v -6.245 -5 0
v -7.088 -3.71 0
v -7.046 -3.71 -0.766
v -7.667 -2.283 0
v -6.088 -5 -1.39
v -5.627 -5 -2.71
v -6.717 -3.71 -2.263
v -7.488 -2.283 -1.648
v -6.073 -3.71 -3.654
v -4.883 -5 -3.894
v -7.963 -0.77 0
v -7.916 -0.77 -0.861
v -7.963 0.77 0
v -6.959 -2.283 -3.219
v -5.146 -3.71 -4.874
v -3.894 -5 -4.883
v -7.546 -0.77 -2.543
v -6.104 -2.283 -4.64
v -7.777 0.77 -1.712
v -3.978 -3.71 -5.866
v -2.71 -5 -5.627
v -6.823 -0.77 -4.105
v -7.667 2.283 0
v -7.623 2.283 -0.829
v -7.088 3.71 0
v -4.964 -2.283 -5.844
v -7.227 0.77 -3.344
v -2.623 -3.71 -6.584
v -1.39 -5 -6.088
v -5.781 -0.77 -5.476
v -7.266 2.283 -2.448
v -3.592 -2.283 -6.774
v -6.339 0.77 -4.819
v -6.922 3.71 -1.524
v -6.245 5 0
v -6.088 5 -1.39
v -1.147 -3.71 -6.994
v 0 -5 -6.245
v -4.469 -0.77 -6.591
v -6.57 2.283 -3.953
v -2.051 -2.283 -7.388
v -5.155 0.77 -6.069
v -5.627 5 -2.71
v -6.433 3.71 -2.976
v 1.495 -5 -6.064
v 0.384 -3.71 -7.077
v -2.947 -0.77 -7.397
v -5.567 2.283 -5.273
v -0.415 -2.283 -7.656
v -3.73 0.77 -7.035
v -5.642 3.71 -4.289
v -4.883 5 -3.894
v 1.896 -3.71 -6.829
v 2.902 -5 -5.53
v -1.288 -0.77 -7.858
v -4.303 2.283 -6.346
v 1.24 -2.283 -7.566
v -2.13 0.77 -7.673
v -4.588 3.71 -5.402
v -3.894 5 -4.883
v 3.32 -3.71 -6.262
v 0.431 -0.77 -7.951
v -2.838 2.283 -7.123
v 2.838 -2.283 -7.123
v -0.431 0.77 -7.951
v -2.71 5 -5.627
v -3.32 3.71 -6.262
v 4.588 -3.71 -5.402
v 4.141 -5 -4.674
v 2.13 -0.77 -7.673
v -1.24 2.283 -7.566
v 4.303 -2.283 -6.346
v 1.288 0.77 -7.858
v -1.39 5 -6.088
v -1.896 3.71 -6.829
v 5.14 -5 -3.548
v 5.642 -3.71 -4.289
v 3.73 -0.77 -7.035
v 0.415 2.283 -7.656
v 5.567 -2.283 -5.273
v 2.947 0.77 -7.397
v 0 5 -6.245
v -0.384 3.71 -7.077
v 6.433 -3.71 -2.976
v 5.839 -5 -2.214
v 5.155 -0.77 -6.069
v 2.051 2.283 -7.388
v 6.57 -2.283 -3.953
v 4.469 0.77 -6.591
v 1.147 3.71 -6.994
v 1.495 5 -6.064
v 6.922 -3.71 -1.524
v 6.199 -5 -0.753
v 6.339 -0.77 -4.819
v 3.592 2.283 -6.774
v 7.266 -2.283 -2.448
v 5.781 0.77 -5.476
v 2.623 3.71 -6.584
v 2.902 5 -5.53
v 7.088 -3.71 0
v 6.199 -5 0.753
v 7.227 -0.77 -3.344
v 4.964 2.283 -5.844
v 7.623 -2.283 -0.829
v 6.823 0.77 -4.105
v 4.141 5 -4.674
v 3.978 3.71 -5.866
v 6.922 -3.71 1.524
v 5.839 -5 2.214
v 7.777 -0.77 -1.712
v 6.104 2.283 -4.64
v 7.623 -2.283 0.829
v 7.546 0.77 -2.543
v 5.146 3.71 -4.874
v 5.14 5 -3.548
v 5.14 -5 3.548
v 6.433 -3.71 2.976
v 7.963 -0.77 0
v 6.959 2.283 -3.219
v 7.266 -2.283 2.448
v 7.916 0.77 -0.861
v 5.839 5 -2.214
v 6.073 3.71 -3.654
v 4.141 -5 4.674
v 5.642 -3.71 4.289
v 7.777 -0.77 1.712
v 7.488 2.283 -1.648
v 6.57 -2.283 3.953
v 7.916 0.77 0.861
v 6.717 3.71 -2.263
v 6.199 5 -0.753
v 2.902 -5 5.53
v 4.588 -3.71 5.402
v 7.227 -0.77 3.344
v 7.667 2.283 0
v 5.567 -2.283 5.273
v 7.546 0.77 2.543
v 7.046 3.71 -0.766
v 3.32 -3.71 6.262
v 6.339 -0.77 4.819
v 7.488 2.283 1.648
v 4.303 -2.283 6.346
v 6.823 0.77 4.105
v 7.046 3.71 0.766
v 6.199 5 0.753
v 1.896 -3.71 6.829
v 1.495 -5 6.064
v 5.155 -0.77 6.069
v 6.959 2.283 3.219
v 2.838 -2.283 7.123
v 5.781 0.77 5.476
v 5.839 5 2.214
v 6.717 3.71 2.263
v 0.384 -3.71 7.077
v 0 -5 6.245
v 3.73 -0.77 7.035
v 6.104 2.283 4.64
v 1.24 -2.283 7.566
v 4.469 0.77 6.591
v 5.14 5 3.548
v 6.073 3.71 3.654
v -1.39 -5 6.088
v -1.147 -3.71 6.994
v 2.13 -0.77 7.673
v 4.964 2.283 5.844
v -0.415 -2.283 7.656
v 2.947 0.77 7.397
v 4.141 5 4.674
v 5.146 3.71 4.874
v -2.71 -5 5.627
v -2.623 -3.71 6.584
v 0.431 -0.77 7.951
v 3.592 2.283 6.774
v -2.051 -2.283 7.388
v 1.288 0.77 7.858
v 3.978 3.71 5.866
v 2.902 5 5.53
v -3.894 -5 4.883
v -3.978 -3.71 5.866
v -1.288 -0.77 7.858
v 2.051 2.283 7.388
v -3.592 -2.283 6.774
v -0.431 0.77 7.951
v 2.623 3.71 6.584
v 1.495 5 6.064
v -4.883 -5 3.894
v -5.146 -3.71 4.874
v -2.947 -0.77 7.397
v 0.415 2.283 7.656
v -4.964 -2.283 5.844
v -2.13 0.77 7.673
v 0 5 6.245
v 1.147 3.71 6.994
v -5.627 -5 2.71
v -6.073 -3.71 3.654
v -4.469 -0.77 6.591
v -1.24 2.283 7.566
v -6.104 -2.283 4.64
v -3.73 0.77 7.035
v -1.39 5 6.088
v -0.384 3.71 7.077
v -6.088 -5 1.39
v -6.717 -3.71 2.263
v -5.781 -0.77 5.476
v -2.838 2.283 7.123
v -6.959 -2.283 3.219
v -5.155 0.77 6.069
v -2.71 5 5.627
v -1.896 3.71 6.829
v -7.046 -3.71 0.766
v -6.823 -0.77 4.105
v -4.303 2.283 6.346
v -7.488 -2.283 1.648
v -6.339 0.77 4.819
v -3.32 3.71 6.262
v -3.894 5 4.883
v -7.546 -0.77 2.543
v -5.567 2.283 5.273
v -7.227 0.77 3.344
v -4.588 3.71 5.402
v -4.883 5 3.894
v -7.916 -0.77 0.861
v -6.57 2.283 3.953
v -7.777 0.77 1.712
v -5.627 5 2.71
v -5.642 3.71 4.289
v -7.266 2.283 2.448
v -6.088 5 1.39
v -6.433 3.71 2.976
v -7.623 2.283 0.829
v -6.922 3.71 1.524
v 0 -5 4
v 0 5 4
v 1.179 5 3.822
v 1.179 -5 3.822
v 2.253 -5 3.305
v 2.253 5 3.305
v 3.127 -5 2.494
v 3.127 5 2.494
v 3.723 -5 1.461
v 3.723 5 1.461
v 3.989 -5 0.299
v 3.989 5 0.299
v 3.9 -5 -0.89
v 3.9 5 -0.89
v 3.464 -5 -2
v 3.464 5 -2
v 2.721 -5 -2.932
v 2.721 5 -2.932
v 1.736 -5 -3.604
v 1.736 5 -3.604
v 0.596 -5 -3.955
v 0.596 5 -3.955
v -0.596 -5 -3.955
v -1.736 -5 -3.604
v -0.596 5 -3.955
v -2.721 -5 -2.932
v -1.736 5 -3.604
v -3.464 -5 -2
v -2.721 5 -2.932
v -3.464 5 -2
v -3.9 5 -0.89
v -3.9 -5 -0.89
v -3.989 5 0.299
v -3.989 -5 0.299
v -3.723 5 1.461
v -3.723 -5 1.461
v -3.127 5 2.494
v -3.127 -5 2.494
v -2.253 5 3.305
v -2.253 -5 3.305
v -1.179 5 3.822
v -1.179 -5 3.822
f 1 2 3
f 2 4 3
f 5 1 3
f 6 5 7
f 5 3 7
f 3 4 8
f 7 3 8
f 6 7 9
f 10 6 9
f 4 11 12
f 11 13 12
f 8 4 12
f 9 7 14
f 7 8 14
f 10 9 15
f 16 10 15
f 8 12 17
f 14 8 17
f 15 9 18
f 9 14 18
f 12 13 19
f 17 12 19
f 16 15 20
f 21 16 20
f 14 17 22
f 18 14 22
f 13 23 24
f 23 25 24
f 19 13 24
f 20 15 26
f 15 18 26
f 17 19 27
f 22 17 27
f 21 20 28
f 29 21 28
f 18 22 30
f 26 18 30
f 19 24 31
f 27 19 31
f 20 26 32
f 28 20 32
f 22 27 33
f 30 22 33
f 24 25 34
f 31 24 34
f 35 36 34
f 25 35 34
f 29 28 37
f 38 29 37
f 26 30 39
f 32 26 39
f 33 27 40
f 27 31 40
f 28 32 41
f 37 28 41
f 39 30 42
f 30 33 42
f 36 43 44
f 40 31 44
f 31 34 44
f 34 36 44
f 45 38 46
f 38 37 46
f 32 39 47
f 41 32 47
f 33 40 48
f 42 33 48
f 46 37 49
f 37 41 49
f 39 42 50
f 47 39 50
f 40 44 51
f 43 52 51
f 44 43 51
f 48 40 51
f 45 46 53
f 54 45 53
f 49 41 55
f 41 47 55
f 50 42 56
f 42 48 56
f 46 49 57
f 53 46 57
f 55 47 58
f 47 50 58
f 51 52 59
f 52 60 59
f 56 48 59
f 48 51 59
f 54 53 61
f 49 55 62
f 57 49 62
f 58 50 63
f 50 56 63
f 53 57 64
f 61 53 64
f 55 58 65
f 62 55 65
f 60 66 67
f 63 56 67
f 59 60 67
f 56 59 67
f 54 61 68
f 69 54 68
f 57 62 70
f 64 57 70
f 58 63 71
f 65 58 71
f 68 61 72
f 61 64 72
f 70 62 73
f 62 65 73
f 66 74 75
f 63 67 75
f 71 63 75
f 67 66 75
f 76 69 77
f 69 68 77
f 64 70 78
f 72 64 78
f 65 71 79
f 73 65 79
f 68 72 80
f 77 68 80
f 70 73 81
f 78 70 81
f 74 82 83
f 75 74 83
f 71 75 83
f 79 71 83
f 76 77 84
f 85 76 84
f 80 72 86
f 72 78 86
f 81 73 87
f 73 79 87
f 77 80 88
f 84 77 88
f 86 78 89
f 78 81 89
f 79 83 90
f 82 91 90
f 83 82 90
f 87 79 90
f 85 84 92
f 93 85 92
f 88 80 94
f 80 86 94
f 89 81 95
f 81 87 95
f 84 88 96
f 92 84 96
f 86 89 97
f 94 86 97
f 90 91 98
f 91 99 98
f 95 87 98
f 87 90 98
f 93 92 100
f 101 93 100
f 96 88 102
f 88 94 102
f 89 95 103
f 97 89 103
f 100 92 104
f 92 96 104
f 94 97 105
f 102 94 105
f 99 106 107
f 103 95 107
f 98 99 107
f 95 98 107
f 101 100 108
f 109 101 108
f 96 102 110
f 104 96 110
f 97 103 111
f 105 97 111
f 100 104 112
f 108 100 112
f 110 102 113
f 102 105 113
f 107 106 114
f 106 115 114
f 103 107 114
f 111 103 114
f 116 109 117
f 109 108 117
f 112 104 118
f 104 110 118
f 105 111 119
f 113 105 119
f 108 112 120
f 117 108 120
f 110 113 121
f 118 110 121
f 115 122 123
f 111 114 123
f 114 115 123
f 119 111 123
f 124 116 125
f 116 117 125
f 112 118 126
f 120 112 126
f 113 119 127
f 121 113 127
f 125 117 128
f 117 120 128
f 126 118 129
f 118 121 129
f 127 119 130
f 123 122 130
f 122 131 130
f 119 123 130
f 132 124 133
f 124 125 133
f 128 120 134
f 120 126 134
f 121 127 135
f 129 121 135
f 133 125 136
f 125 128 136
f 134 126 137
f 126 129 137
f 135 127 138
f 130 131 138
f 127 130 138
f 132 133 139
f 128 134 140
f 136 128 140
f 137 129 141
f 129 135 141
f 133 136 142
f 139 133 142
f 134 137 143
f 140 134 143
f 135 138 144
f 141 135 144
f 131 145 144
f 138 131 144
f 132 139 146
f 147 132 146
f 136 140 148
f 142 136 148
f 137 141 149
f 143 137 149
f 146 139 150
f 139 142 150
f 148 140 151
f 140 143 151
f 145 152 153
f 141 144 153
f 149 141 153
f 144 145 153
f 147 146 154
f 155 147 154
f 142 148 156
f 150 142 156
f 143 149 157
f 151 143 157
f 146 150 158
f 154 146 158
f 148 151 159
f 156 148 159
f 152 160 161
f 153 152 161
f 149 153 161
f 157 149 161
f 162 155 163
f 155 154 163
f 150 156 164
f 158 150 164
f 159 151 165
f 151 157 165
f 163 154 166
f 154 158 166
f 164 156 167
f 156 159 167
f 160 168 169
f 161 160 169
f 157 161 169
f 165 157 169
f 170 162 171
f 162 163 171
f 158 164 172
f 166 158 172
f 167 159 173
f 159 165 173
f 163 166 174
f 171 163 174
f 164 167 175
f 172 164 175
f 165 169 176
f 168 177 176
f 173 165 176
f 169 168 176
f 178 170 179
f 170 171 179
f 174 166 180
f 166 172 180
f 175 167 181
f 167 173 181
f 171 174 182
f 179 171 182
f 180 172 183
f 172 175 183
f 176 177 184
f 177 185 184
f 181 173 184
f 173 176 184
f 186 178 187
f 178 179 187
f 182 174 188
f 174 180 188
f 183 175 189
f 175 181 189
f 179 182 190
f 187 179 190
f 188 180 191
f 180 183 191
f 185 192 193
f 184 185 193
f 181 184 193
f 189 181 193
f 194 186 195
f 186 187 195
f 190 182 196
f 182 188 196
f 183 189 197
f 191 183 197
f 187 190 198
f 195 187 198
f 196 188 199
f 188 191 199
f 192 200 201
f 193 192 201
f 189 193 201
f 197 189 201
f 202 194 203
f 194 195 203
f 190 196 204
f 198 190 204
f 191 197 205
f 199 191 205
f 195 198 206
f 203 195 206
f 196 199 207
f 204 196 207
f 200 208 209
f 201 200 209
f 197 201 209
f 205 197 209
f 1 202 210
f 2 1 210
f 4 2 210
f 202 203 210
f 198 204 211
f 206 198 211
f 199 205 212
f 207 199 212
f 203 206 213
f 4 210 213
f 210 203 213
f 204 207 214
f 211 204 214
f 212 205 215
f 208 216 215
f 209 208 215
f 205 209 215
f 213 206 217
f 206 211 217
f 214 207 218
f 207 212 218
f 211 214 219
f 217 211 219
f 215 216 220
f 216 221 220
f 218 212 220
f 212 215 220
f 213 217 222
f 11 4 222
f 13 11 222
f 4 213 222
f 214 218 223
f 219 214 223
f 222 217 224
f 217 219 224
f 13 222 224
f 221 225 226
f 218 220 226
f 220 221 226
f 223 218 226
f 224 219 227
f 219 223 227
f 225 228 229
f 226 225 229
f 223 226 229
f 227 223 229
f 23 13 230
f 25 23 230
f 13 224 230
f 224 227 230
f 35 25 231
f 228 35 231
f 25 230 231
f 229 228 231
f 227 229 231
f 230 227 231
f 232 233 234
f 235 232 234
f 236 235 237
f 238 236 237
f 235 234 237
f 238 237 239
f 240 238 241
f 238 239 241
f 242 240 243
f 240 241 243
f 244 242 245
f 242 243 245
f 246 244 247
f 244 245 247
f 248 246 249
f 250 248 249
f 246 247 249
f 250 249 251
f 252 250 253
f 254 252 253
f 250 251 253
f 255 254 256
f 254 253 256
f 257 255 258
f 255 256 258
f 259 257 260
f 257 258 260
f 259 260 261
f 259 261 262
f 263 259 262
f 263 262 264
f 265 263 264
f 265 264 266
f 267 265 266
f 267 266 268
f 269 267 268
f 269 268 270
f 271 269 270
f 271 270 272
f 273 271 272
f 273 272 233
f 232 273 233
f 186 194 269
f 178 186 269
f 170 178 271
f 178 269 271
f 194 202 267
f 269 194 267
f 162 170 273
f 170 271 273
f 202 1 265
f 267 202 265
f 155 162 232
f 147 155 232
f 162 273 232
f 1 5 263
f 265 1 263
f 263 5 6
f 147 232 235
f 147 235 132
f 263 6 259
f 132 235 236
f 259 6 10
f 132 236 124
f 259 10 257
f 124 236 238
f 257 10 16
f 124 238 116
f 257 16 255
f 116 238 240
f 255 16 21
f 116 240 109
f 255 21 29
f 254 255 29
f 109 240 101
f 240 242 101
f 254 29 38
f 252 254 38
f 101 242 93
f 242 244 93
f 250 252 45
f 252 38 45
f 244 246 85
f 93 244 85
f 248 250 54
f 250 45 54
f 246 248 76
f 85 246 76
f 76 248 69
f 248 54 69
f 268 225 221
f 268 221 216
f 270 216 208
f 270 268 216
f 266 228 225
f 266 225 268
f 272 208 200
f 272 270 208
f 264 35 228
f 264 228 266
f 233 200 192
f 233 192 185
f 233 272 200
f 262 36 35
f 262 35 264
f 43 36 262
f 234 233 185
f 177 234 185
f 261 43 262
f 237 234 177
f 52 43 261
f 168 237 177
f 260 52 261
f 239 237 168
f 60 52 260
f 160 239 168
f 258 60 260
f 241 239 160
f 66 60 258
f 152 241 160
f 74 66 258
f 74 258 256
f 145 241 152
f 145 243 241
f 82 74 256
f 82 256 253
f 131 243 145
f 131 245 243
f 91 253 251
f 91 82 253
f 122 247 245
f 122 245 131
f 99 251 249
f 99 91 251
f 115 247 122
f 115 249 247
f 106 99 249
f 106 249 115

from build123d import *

# Parameters (mm, degrees)
CUT_EXTRUDE1_START     = -6.244997998
CUT_EXTRUDE1_OUTLINE_W = 16
CUT_EXTRUDE1_OUTLINE_H = 4
CUT_EXTRUDE1_DEPTH     = 12.489995996
CUT_EXTRUDE2_REACH     = 17.1
SKETCH3_R              = 4


# Read off the part's stored shape, not the designer's step: Cut-Extrude1
with BuildPart() as part:
    # Sketch1 → Revolve1 (revolve)
    with BuildSketch(Plane.XY):
        with BuildLine():
            Line((0, 8), (0, -8))
            ThreePointArc((0, -8), (-8, 0), (0, 8))
        make_face()
    revolve(axis=Axis((0, 8, 0), (0, -1, 0)))

    # Cut-Extrude1 outline → Cut-Extrude1 (cut)
    with BuildSketch(Plane.XY.offset(CUT_EXTRUDE1_START)):
        with Locations((0, -7)):
            Rectangle(CUT_EXTRUDE1_OUTLINE_W, CUT_EXTRUDE1_OUTLINE_H)
        with Locations((0, 7)):
            Rectangle(CUT_EXTRUDE1_OUTLINE_W, CUT_EXTRUDE1_OUTLINE_H)
    extrude(amount=CUT_EXTRUDE1_DEPTH, mode=Mode.SUBTRACT)

    # Sketch3 → Cut-Extrude2 (cut, up to next)
    with BuildSketch(Plane(origin=(0, 5, 0), x_dir=(1, 0, 0), z_dir=(0, 1, 0)), mode=Mode.PRIVATE) as cut_extrude2_sk1:
        with Locations(Location((0, 0, 0), (0, 0, 270))):
            Circle(SKETCH3_R)
    cut_extrude2_tool1 = extrude(cut_extrude2_sk1.sketch, amount=-CUT_EXTRUDE2_REACH, mode=Mode.PRIVATE) & part.part
    add(cut_extrude2_tool1.solids().sort_by_distance((0, 5, 0))[0], mode=Mode.SUBTRACT)


solid = part.part
